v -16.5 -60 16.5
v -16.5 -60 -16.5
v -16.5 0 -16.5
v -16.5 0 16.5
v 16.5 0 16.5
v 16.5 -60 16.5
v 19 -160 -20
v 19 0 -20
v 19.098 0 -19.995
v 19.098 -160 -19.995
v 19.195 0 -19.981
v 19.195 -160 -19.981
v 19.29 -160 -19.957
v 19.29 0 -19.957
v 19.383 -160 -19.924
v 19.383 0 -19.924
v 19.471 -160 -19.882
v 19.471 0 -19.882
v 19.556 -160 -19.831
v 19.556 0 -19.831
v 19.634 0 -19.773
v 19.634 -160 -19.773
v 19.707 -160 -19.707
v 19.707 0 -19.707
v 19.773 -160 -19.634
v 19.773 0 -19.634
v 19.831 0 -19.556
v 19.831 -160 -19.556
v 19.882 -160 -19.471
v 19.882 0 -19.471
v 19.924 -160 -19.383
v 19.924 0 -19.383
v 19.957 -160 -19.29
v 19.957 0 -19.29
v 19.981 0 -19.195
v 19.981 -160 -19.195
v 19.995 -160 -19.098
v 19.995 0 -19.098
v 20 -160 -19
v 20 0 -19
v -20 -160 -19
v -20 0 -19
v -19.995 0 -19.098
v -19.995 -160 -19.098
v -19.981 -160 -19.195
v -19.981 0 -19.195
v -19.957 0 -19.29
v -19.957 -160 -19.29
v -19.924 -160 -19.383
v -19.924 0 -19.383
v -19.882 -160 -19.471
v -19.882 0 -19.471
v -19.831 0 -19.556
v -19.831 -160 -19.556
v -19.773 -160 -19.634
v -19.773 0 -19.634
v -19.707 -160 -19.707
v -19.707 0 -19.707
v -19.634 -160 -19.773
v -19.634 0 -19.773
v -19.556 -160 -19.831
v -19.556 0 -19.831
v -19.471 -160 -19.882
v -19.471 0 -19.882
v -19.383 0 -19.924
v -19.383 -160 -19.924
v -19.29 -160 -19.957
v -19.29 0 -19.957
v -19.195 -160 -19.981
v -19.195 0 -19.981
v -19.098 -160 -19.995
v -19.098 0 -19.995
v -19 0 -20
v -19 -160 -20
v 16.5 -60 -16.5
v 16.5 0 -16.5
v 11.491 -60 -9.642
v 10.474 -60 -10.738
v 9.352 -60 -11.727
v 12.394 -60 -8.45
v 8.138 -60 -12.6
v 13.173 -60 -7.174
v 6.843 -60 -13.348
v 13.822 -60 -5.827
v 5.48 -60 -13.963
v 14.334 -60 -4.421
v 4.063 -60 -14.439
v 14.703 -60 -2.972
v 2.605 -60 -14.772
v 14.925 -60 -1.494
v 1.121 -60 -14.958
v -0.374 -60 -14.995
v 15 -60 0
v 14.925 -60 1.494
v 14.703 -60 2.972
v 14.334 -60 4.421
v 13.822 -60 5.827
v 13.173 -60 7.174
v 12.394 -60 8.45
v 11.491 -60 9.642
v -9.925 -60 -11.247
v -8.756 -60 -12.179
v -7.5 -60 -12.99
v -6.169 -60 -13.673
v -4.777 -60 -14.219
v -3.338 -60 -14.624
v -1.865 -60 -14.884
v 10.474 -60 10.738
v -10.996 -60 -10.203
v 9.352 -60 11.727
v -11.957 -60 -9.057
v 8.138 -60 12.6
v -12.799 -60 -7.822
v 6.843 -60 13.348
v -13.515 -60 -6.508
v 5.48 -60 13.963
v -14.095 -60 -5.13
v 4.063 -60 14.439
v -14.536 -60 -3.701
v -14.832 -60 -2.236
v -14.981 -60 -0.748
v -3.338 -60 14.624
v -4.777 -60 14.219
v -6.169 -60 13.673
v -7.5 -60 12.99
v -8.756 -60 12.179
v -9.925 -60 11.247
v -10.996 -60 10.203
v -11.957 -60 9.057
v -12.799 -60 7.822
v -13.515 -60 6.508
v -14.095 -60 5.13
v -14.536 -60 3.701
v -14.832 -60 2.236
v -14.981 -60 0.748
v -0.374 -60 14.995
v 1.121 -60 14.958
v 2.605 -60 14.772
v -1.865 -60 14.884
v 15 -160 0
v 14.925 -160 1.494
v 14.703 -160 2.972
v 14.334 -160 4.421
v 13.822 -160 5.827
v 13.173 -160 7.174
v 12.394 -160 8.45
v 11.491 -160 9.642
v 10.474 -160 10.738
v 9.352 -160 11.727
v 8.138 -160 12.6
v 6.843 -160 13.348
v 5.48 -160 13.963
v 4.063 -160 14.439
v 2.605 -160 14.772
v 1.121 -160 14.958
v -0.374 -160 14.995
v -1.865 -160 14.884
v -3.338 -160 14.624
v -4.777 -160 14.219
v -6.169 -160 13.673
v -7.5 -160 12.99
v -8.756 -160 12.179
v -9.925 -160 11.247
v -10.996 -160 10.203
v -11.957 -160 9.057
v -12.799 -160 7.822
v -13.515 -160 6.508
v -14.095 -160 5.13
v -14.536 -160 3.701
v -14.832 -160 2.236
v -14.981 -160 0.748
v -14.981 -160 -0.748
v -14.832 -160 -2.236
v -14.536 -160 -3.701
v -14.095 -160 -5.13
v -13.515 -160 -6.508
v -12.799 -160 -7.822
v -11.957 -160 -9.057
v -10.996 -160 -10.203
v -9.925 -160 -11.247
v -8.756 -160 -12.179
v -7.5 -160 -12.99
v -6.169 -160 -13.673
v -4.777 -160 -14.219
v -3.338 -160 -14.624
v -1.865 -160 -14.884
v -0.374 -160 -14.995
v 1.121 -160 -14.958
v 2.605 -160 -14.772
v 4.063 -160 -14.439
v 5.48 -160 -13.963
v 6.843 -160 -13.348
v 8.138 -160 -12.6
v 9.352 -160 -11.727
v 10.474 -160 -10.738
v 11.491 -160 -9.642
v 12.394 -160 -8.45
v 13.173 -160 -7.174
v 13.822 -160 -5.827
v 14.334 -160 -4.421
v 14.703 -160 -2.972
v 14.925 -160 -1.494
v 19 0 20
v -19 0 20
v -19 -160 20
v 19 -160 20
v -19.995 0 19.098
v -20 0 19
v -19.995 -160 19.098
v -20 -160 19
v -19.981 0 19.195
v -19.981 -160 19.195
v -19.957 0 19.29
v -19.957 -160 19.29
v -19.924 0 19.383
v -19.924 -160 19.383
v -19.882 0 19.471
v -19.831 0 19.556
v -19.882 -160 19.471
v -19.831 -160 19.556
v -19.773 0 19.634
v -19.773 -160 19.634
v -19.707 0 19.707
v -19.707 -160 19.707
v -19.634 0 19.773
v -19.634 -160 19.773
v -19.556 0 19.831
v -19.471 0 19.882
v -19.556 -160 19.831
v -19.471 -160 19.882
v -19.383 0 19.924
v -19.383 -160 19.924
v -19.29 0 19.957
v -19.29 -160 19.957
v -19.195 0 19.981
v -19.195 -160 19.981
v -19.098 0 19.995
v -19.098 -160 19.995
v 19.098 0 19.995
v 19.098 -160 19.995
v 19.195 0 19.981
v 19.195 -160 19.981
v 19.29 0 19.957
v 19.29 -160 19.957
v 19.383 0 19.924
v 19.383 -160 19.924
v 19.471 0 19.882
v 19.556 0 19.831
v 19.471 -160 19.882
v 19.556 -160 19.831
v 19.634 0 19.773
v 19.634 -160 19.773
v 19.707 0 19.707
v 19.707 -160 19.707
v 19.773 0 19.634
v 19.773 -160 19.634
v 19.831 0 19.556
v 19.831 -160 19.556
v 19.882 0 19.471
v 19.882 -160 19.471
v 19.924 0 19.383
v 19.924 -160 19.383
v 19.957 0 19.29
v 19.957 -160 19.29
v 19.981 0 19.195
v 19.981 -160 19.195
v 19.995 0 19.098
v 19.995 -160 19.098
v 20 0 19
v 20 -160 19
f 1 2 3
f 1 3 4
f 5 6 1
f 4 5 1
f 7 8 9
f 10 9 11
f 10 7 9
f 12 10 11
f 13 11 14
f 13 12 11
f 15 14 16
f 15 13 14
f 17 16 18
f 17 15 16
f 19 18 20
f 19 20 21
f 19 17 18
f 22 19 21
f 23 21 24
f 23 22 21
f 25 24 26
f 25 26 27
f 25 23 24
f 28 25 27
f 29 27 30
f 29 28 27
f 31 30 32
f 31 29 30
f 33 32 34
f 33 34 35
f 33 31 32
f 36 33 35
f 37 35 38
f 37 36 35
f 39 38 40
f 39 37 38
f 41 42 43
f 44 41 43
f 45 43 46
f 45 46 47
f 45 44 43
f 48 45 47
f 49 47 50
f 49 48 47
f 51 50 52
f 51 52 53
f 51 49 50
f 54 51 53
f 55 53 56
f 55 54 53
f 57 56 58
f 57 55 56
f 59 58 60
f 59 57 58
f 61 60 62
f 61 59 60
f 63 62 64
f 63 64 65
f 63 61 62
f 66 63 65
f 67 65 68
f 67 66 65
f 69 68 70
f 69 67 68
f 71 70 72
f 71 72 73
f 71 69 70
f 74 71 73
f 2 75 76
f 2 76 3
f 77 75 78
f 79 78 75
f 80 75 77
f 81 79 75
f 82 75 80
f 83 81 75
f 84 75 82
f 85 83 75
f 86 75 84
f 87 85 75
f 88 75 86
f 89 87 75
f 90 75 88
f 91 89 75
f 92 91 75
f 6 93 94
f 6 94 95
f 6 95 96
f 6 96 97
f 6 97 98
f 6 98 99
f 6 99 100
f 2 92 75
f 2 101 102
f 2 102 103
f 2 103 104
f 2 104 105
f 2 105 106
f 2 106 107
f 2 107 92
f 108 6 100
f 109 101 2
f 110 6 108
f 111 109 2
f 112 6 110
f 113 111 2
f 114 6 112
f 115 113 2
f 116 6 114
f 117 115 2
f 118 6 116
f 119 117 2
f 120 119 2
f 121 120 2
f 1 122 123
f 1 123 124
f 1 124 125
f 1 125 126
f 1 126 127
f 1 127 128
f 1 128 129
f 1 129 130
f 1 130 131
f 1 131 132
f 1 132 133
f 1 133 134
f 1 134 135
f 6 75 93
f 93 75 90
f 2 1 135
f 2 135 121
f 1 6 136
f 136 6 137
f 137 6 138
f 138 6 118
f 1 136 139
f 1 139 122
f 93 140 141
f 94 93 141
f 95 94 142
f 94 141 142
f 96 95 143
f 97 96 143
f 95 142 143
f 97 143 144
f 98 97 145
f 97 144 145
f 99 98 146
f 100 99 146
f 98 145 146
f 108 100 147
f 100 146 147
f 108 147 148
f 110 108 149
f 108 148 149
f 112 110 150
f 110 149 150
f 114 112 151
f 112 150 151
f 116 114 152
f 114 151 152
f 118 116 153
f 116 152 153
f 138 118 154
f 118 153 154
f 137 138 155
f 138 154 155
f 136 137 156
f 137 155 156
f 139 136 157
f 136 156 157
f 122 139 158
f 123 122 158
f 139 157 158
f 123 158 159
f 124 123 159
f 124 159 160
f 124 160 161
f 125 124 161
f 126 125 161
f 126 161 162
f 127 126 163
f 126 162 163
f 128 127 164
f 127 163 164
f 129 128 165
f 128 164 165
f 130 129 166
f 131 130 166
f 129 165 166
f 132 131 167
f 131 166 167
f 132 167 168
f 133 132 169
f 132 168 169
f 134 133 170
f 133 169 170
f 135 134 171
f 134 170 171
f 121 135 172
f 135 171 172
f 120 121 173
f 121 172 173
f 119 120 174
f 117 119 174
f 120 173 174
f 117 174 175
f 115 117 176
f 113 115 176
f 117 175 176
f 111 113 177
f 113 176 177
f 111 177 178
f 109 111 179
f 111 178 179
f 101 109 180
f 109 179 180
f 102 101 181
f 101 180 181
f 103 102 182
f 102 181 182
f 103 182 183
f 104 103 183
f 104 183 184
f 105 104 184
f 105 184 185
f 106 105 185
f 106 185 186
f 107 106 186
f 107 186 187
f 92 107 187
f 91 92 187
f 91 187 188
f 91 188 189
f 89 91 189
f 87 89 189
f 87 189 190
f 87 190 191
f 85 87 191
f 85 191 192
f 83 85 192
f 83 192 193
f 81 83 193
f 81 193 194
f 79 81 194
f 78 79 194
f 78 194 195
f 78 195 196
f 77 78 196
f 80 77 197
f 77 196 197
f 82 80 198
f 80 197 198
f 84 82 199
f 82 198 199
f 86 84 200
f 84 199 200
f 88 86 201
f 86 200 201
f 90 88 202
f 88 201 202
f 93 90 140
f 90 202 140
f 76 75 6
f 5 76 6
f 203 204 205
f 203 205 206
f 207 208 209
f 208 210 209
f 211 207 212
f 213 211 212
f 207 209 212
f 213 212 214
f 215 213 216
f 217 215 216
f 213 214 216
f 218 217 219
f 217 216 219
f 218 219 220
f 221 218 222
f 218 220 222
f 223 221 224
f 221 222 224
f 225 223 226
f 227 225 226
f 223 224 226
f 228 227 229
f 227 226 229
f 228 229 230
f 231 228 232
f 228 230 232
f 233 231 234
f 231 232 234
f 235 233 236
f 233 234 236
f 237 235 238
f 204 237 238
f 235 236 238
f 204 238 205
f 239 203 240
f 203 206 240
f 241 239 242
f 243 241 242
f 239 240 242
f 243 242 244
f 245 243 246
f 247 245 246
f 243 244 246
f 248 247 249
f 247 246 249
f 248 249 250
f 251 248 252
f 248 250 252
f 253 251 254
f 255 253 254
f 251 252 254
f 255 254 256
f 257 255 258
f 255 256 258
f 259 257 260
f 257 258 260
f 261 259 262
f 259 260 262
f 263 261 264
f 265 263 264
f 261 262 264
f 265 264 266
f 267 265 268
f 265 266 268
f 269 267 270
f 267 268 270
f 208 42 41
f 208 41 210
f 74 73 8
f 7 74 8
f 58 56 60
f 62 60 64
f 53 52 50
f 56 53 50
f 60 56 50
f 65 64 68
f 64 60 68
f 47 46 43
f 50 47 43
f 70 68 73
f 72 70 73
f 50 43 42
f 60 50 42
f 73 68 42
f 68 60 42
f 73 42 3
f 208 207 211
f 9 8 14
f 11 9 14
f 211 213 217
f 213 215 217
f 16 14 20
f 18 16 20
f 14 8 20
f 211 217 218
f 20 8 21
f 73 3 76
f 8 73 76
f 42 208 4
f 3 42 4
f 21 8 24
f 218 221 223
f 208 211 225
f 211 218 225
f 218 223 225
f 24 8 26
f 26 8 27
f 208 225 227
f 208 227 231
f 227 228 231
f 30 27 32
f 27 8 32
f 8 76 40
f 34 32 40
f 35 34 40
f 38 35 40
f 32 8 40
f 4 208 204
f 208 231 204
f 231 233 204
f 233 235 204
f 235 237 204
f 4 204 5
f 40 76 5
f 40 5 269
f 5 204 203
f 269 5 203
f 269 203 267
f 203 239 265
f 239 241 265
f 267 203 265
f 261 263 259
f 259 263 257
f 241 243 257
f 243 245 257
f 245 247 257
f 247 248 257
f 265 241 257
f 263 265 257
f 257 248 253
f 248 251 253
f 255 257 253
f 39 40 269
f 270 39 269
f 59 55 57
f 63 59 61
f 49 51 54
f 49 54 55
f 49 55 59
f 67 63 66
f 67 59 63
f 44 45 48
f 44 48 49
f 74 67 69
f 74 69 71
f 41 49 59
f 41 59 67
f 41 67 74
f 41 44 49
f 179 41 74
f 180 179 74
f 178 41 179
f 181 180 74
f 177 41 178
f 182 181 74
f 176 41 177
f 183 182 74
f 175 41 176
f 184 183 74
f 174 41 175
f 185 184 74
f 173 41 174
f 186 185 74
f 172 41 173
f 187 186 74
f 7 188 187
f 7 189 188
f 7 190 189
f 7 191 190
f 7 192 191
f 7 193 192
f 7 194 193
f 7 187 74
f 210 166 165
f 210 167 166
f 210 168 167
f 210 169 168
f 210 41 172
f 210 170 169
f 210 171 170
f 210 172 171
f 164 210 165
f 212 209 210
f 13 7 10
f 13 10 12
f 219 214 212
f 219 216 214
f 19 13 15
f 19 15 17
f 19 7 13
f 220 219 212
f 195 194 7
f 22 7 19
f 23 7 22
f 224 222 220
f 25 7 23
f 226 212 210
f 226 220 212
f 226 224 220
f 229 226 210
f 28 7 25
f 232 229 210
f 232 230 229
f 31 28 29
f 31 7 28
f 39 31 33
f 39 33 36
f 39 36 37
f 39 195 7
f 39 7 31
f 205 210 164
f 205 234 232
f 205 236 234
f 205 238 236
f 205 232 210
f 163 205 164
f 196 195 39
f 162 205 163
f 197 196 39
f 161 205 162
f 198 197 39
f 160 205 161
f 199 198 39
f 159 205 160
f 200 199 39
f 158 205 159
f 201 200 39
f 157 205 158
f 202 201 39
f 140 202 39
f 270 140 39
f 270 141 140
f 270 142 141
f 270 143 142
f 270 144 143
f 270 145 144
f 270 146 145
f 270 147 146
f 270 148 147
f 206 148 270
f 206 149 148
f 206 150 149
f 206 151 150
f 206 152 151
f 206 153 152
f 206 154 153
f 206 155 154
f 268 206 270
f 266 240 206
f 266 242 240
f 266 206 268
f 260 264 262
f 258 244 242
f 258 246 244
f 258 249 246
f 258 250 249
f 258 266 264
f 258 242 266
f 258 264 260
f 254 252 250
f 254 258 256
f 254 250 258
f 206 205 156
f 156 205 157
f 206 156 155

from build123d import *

# Parameters (mm, degrees)
F0_W     = 40
F0_H     = 40
F1_DEPTH = 160
F2_R     = 15
F3_DEPTH = 100
F4_W     = 33
F4_H     = 33
F5_DEPTH = 60
F6_R     = 1


with BuildPart() as f1:
    # F0 (on Front) → F1 (new body)
    with BuildSketch(Plane.XZ):
        Rectangle(F0_W, F0_H)
    extrude(amount=F1_DEPTH)

    # F2 (on face) → F3 (cut)
    with BuildSketch(Plane.XZ.offset(160)):
        Circle(F2_R)
    extrude(amount=-F3_DEPTH, mode=Mode.SUBTRACT)

    # F4 (on face) → F5 (cut)
    with BuildSketch(Plane(origin=(0, 0, 0), x_dir=(-1, 0, 0), z_dir=(0, 1, 0))):
        Rectangle(F4_W, F4_H)
    extrude(amount=-F5_DEPTH, mode=Mode.SUBTRACT)

    # F6
    f6_edges = [f1.edges().sort_by_distance(p)[0] for p in [
        (20, -80, 20),
        (-20, -80, 20),
        (20, -80, -20),
        (-20, -80, -20),
    ]]
    fillet(f6_edges, radius=F6_R)


solid = f1.part
